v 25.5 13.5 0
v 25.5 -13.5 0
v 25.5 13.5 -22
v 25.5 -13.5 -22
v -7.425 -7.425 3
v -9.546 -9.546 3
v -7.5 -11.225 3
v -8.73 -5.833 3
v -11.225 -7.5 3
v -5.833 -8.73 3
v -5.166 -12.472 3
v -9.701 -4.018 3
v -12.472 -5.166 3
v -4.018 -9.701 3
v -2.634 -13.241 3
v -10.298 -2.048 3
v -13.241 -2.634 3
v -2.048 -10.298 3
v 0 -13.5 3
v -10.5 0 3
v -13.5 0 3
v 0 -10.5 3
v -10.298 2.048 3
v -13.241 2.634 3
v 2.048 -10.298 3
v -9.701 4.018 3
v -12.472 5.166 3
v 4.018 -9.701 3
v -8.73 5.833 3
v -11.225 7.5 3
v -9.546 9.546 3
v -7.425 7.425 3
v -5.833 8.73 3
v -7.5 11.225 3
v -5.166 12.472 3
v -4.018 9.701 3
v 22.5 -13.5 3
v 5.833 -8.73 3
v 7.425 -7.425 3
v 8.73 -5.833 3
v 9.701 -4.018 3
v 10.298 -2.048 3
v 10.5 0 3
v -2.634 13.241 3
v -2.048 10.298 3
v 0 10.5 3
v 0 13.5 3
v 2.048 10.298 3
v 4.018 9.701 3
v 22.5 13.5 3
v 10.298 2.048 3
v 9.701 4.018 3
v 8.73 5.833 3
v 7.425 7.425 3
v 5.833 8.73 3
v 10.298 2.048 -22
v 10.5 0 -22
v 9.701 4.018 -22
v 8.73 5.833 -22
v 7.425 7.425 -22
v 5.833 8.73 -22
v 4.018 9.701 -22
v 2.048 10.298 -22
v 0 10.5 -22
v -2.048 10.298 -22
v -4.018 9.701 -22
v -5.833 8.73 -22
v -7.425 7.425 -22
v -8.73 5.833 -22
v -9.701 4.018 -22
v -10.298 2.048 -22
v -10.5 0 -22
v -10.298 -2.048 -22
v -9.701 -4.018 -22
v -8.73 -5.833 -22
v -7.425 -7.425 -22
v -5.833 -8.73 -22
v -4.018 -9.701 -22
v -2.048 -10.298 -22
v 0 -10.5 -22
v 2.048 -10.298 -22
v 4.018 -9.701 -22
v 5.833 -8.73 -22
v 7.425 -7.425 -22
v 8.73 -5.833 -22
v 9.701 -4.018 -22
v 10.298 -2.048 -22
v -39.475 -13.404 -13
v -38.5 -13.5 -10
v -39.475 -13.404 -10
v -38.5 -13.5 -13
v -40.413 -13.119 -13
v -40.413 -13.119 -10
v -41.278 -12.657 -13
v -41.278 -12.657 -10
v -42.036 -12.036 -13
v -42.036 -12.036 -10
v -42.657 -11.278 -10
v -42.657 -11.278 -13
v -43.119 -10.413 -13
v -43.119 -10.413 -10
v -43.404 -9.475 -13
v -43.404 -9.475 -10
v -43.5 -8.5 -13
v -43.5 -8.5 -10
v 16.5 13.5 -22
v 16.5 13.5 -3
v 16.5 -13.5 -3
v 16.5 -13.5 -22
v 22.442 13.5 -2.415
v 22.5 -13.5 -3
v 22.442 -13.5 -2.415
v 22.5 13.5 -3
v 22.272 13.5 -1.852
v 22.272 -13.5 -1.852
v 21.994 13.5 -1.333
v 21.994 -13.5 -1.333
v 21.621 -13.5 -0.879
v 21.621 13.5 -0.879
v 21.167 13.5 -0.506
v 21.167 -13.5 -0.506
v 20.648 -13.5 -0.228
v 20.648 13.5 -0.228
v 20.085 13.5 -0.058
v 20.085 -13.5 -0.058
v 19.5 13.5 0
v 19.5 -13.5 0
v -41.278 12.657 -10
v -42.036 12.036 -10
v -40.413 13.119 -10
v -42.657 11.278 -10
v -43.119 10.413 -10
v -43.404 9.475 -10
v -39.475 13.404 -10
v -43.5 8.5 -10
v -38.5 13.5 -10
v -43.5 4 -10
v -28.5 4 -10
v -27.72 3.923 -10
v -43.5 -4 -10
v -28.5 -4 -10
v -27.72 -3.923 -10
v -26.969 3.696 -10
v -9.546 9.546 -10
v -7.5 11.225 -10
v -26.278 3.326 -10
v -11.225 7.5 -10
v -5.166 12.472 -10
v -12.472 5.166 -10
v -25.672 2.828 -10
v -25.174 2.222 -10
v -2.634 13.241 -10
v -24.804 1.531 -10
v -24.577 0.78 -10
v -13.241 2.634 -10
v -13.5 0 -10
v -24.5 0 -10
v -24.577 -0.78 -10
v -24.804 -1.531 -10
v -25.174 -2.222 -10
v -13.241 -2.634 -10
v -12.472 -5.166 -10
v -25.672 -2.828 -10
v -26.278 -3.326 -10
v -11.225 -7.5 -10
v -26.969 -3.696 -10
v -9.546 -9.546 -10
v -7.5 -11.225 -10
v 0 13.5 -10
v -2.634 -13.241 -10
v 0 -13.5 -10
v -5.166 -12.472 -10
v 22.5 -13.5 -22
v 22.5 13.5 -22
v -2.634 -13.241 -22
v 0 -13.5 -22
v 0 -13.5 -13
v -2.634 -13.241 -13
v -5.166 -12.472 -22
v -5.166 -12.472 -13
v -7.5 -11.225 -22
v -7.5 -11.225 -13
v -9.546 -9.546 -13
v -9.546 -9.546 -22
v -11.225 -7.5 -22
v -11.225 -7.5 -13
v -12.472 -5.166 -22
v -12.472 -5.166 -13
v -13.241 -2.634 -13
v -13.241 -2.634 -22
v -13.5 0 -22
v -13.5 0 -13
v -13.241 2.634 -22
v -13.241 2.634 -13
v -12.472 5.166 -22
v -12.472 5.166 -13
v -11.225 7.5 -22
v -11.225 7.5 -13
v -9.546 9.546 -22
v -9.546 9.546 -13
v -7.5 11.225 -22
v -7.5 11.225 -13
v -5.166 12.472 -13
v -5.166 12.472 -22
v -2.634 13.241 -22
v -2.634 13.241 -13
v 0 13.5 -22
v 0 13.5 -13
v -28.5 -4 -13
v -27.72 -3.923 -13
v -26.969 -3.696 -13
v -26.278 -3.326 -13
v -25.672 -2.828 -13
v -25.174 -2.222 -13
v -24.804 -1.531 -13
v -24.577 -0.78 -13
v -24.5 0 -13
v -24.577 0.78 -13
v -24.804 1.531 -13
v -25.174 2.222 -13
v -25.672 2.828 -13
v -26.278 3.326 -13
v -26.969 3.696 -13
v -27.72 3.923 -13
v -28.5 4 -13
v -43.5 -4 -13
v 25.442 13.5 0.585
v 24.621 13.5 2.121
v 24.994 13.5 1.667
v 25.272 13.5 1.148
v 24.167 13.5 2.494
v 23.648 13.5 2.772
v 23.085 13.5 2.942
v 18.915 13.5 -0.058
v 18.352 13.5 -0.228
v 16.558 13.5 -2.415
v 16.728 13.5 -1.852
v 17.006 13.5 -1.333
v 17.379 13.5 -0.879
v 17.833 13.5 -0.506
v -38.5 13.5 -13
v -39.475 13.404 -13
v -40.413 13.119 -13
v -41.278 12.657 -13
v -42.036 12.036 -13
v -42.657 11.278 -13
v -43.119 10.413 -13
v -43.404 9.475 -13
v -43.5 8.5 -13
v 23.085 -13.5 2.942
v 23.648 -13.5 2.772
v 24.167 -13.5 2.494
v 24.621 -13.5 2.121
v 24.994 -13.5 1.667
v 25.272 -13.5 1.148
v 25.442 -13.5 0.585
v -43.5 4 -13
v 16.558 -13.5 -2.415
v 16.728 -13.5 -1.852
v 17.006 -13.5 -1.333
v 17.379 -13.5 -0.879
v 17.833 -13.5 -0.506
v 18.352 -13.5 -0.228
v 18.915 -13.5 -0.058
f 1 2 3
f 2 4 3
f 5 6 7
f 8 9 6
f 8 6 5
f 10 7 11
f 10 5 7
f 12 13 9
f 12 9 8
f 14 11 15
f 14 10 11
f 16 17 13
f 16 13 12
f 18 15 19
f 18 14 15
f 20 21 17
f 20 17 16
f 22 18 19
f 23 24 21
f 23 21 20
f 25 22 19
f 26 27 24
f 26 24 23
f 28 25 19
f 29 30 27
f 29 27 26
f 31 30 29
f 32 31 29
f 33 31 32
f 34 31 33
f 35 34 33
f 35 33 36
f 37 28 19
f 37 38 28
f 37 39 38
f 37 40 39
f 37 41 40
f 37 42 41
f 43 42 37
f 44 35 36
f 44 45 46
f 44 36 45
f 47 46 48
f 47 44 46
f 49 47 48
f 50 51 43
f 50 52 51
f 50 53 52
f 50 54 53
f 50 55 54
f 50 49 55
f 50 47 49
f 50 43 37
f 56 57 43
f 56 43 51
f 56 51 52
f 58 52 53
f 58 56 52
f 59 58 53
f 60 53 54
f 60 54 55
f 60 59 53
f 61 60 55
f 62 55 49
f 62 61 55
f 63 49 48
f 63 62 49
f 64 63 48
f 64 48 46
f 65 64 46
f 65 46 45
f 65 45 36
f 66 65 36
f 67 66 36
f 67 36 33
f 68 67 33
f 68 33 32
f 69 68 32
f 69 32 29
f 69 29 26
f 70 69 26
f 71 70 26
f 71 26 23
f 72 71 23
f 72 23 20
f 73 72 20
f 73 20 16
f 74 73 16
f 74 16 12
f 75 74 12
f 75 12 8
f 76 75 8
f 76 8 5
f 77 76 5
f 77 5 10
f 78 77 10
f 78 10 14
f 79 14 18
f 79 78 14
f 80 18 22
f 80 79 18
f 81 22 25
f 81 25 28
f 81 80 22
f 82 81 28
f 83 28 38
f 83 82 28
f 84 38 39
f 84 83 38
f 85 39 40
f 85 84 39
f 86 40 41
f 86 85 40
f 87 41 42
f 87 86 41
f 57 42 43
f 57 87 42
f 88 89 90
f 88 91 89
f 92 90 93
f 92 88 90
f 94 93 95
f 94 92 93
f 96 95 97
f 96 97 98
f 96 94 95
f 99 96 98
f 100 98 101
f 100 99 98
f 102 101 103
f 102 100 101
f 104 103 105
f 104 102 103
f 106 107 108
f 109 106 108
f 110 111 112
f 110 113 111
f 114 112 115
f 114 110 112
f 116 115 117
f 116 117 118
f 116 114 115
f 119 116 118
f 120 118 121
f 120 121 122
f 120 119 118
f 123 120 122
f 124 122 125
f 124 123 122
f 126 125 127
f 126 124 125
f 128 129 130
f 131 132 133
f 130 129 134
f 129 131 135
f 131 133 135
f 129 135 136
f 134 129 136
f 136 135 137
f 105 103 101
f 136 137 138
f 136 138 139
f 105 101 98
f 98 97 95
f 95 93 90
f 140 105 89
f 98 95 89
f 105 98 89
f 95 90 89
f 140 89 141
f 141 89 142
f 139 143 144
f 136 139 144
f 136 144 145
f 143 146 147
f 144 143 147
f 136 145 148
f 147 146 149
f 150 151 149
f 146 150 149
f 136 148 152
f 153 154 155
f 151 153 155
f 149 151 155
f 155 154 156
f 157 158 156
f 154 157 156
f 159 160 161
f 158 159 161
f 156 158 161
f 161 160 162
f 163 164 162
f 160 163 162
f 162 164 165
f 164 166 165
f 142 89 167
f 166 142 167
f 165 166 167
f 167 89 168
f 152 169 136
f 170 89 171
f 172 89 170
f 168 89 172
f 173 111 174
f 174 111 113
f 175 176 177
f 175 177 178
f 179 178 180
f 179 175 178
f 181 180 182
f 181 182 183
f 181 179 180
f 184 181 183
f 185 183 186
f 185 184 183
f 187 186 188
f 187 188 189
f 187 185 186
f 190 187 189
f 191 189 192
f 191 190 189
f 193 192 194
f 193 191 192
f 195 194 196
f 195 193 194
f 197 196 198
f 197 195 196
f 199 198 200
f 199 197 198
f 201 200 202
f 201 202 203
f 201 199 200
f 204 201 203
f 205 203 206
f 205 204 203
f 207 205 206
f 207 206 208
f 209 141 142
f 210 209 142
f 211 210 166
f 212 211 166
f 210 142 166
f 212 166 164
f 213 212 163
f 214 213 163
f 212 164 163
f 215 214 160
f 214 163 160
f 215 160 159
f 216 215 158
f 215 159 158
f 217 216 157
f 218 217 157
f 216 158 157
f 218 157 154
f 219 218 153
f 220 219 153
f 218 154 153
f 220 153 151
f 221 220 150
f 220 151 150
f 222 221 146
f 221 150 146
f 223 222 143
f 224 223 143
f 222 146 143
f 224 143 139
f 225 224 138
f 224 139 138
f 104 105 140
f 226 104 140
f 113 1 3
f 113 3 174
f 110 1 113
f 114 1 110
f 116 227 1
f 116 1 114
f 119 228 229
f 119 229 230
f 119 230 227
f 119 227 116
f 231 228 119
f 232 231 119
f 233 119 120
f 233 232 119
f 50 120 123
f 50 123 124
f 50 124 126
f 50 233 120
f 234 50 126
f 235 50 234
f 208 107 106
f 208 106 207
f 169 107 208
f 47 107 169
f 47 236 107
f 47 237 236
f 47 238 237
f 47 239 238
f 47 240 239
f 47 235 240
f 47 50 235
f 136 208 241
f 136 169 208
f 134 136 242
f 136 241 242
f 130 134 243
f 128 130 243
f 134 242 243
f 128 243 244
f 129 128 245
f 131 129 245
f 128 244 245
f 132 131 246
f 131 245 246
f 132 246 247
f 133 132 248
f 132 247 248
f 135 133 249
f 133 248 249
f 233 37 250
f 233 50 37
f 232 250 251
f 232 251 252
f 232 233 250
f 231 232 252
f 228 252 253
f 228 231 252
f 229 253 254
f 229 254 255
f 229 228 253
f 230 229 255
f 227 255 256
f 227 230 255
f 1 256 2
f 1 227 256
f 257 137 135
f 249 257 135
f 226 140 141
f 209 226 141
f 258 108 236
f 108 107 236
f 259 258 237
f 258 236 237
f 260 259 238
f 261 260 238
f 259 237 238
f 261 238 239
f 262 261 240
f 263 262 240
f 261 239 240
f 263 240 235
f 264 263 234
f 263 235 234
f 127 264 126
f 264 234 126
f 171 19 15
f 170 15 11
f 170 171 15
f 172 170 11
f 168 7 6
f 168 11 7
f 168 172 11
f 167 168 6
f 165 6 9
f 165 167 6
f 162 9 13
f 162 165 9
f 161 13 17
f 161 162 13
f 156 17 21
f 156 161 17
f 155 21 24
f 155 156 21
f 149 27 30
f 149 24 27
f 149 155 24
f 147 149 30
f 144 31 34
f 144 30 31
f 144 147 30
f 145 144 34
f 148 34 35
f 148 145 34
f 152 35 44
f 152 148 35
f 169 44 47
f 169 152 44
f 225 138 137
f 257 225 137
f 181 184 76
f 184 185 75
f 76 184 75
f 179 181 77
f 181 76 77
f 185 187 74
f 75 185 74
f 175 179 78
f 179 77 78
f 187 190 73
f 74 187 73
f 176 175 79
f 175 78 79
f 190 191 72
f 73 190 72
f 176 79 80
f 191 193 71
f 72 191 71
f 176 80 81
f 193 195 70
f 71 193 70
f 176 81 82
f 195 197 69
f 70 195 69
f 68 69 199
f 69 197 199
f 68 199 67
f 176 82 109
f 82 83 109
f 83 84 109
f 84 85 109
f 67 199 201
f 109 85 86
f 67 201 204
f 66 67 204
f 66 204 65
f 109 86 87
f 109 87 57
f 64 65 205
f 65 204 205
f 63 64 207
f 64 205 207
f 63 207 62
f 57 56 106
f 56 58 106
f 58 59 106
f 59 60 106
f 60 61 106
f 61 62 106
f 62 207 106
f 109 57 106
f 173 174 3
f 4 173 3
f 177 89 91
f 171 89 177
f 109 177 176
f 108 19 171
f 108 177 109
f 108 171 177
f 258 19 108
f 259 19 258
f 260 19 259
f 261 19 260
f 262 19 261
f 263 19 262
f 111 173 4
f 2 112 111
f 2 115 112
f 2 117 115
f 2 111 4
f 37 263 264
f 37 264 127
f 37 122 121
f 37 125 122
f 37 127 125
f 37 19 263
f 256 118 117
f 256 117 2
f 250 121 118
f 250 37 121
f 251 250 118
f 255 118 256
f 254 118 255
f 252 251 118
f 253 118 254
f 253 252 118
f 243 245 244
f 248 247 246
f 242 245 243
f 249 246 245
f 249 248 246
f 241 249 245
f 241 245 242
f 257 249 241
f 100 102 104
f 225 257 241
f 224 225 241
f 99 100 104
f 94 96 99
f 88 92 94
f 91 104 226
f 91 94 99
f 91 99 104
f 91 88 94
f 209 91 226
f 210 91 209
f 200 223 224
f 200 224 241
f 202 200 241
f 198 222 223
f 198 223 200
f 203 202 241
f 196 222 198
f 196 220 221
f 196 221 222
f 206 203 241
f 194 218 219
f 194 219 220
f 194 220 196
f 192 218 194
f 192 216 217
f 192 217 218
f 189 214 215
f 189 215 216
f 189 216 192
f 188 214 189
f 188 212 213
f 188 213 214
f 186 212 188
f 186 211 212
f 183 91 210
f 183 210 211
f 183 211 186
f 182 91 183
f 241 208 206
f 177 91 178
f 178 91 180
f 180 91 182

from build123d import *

# Parameters (mm, degrees)
F0_R     = 10.5
F0_W     = 6
F0_H     = 27
F0_W_2   = 3
F1_DEPTH = 3
F2_DEPTH = 22
F3_R     = 2.99999
F5_R     = 10.5
F6_DEPTH = 12
F7_DEPTH = 3
F8_R     = 5


# Not quite as in the source:
# - a fillet or chamfer is up to 0.001 mm smaller than in the source, because OpenCascade refuses the exact size


with BuildPart() as f1:
    # F0 (on Top) → F1 (new body)
    with BuildSketch(Plane.XY):
        with BuildLine():
            ThreePointArc((0, -13.5), (9.545941546, -9.545941546), (13.5, 0))
            ThreePointArc((13.5, 0), (9.545941546, 9.545941546), (0, 13.5))
            ThreePointArc((0, 13.5), (-13.5, 0), (0, -13.5))
        make_face()
        Circle(F0_R, mode=Mode.SUBTRACT)
        with BuildLine():
            Line((13.5, -13.5), (13.5, 0))
            ThreePointArc((13.5, 0), (9.545941546, -9.545941546), (0, -13.5))
            Line((0, -13.5), (13.5, -13.5))
        make_face()
        with BuildLine():
            ThreePointArc((0, 13.5), (9.545941546, 9.545941546), (13.5, 0))
            Line((13.5, 0), (13.5, 13.5))
            Line((13.5, 13.5), (0, 13.5))
        make_face()
        Polygon((13.5, 13.5), (13.5, 0), (13.5, -13.5), (16.5, -13.5), (16.5, 13.5), align=None)
        with Locations((19.5, 0)):
            Rectangle(F0_W, F0_H)
        with Locations((24, 0)):
            Rectangle(F0_W_2, F0_H)
    extrude(amount=F1_DEPTH)

    # F0 (on Top) → F2 (join)
    with BuildSketch(Plane.XY):
        with BuildLine():
            ThreePointArc((0, -13.5), (9.545941546, -9.545941546), (13.5, 0))
            ThreePointArc((13.5, 0), (9.545941546, 9.545941546), (0, 13.5))
            ThreePointArc((0, 13.5), (-13.5, 0), (0, -13.5))
        make_face()
        Circle(F0_R, mode=Mode.SUBTRACT)
        with BuildLine():
            ThreePointArc((0, 13.5), (9.545941546, 9.545941546), (13.5, 0))
            Line((13.5, 0), (13.5, 13.5))
            Line((13.5, 13.5), (0, 13.5))
        make_face()
        Polygon((13.5, 13.5), (13.5, 0), (13.5, -13.5), (16.5, -13.5), (16.5, 13.5), align=None)
        with Locations((24, 0)):
            Rectangle(F0_W_2, F0_H)
        with BuildLine():
            Line((13.5, -13.5), (13.5, 0))
            ThreePointArc((13.5, 0), (9.545941546, -9.545941546), (0, -13.5))
            Line((0, -13.5), (13.5, -13.5))
        make_face()
    extrude(amount=-F2_DEPTH)

    # F3 (radius 3 in the source; OpenCascade refuses exactly that, so slightly less here)
    f3_edges = [f1.edges().sort_by_distance(p)[0] for p in [
        (16.5, 0, 0),
        (22.5, 0, 0),
        (25.5, 0, 3),
    ]]
    fillet(f3_edges, radius=F3_R)



with BuildPart() as f6:
    # F5 (on offset) → F6 (new body)
    with BuildSketch(Plane(origin=(0, 0, -10), x_dir=(1, 0, 0), z_dir=(0, 0, -1))):
        with BuildLine():
            Line((16.5, 13.5), (0, 13.5))
            ThreePointArc((0, 13.5), (-13.5, 0), (0, -13.5))
            Line((0, -13.5), (16.5, -13.5))
            Line((16.5, -13.5), (16.5, 13.5))
        make_face()
        Circle(F5_R, mode=Mode.SUBTRACT)
    extrude(amount=-F6_DEPTH)


with BuildPart() as f1_1:
    add(f1.part)

    add(f6.part)  # F7 merges F6
    # F5 (on offset) → F7 (join)
    with BuildSketch(Plane(origin=(0, 0, -10), x_dir=(1, 0, 0), z_dir=(0, 0, -1))):
        with BuildLine():
            Line((16.5, 13.5), (0, 13.5))
            ThreePointArc((0, 13.5), (-13.5, 0), (0, -13.5))
            Line((0, -13.5), (16.5, -13.5))
            Line((16.5, -13.5), (16.5, 13.5))
        make_face()
        Circle(F5_R, mode=Mode.SUBTRACT)
        with BuildLine():
            ThreePointArc((0, -13.5), (-13.5, 0), (0, 13.5))
            Line((0, 13.5), (-43.5, 13.5))
            Line((-43.5, 13.5), (-43.5, 4))
            Line((-43.5, 4), (-28.5, 4))
            ThreePointArc((-28.5, 4), (-24.5, 0), (-28.5, -4))
            Line((-28.5, -4), (-43.5, -4))
            Line((-43.5, -4), (-43.5, -13.5))
            Line((-43.5, -13.5), (0, -13.5))
        make_face()
    extrude(amount=F7_DEPTH)

    # F8
    f8_edges = [f1_1.edges().sort_by_distance(p)[0] for p in [
        (-43.5, -13.5, -11.5),
        (-43.5, 13.5, -11.5),
    ]]
    fillet(f8_edges, radius=F8_R)


solid = f1_1.part
